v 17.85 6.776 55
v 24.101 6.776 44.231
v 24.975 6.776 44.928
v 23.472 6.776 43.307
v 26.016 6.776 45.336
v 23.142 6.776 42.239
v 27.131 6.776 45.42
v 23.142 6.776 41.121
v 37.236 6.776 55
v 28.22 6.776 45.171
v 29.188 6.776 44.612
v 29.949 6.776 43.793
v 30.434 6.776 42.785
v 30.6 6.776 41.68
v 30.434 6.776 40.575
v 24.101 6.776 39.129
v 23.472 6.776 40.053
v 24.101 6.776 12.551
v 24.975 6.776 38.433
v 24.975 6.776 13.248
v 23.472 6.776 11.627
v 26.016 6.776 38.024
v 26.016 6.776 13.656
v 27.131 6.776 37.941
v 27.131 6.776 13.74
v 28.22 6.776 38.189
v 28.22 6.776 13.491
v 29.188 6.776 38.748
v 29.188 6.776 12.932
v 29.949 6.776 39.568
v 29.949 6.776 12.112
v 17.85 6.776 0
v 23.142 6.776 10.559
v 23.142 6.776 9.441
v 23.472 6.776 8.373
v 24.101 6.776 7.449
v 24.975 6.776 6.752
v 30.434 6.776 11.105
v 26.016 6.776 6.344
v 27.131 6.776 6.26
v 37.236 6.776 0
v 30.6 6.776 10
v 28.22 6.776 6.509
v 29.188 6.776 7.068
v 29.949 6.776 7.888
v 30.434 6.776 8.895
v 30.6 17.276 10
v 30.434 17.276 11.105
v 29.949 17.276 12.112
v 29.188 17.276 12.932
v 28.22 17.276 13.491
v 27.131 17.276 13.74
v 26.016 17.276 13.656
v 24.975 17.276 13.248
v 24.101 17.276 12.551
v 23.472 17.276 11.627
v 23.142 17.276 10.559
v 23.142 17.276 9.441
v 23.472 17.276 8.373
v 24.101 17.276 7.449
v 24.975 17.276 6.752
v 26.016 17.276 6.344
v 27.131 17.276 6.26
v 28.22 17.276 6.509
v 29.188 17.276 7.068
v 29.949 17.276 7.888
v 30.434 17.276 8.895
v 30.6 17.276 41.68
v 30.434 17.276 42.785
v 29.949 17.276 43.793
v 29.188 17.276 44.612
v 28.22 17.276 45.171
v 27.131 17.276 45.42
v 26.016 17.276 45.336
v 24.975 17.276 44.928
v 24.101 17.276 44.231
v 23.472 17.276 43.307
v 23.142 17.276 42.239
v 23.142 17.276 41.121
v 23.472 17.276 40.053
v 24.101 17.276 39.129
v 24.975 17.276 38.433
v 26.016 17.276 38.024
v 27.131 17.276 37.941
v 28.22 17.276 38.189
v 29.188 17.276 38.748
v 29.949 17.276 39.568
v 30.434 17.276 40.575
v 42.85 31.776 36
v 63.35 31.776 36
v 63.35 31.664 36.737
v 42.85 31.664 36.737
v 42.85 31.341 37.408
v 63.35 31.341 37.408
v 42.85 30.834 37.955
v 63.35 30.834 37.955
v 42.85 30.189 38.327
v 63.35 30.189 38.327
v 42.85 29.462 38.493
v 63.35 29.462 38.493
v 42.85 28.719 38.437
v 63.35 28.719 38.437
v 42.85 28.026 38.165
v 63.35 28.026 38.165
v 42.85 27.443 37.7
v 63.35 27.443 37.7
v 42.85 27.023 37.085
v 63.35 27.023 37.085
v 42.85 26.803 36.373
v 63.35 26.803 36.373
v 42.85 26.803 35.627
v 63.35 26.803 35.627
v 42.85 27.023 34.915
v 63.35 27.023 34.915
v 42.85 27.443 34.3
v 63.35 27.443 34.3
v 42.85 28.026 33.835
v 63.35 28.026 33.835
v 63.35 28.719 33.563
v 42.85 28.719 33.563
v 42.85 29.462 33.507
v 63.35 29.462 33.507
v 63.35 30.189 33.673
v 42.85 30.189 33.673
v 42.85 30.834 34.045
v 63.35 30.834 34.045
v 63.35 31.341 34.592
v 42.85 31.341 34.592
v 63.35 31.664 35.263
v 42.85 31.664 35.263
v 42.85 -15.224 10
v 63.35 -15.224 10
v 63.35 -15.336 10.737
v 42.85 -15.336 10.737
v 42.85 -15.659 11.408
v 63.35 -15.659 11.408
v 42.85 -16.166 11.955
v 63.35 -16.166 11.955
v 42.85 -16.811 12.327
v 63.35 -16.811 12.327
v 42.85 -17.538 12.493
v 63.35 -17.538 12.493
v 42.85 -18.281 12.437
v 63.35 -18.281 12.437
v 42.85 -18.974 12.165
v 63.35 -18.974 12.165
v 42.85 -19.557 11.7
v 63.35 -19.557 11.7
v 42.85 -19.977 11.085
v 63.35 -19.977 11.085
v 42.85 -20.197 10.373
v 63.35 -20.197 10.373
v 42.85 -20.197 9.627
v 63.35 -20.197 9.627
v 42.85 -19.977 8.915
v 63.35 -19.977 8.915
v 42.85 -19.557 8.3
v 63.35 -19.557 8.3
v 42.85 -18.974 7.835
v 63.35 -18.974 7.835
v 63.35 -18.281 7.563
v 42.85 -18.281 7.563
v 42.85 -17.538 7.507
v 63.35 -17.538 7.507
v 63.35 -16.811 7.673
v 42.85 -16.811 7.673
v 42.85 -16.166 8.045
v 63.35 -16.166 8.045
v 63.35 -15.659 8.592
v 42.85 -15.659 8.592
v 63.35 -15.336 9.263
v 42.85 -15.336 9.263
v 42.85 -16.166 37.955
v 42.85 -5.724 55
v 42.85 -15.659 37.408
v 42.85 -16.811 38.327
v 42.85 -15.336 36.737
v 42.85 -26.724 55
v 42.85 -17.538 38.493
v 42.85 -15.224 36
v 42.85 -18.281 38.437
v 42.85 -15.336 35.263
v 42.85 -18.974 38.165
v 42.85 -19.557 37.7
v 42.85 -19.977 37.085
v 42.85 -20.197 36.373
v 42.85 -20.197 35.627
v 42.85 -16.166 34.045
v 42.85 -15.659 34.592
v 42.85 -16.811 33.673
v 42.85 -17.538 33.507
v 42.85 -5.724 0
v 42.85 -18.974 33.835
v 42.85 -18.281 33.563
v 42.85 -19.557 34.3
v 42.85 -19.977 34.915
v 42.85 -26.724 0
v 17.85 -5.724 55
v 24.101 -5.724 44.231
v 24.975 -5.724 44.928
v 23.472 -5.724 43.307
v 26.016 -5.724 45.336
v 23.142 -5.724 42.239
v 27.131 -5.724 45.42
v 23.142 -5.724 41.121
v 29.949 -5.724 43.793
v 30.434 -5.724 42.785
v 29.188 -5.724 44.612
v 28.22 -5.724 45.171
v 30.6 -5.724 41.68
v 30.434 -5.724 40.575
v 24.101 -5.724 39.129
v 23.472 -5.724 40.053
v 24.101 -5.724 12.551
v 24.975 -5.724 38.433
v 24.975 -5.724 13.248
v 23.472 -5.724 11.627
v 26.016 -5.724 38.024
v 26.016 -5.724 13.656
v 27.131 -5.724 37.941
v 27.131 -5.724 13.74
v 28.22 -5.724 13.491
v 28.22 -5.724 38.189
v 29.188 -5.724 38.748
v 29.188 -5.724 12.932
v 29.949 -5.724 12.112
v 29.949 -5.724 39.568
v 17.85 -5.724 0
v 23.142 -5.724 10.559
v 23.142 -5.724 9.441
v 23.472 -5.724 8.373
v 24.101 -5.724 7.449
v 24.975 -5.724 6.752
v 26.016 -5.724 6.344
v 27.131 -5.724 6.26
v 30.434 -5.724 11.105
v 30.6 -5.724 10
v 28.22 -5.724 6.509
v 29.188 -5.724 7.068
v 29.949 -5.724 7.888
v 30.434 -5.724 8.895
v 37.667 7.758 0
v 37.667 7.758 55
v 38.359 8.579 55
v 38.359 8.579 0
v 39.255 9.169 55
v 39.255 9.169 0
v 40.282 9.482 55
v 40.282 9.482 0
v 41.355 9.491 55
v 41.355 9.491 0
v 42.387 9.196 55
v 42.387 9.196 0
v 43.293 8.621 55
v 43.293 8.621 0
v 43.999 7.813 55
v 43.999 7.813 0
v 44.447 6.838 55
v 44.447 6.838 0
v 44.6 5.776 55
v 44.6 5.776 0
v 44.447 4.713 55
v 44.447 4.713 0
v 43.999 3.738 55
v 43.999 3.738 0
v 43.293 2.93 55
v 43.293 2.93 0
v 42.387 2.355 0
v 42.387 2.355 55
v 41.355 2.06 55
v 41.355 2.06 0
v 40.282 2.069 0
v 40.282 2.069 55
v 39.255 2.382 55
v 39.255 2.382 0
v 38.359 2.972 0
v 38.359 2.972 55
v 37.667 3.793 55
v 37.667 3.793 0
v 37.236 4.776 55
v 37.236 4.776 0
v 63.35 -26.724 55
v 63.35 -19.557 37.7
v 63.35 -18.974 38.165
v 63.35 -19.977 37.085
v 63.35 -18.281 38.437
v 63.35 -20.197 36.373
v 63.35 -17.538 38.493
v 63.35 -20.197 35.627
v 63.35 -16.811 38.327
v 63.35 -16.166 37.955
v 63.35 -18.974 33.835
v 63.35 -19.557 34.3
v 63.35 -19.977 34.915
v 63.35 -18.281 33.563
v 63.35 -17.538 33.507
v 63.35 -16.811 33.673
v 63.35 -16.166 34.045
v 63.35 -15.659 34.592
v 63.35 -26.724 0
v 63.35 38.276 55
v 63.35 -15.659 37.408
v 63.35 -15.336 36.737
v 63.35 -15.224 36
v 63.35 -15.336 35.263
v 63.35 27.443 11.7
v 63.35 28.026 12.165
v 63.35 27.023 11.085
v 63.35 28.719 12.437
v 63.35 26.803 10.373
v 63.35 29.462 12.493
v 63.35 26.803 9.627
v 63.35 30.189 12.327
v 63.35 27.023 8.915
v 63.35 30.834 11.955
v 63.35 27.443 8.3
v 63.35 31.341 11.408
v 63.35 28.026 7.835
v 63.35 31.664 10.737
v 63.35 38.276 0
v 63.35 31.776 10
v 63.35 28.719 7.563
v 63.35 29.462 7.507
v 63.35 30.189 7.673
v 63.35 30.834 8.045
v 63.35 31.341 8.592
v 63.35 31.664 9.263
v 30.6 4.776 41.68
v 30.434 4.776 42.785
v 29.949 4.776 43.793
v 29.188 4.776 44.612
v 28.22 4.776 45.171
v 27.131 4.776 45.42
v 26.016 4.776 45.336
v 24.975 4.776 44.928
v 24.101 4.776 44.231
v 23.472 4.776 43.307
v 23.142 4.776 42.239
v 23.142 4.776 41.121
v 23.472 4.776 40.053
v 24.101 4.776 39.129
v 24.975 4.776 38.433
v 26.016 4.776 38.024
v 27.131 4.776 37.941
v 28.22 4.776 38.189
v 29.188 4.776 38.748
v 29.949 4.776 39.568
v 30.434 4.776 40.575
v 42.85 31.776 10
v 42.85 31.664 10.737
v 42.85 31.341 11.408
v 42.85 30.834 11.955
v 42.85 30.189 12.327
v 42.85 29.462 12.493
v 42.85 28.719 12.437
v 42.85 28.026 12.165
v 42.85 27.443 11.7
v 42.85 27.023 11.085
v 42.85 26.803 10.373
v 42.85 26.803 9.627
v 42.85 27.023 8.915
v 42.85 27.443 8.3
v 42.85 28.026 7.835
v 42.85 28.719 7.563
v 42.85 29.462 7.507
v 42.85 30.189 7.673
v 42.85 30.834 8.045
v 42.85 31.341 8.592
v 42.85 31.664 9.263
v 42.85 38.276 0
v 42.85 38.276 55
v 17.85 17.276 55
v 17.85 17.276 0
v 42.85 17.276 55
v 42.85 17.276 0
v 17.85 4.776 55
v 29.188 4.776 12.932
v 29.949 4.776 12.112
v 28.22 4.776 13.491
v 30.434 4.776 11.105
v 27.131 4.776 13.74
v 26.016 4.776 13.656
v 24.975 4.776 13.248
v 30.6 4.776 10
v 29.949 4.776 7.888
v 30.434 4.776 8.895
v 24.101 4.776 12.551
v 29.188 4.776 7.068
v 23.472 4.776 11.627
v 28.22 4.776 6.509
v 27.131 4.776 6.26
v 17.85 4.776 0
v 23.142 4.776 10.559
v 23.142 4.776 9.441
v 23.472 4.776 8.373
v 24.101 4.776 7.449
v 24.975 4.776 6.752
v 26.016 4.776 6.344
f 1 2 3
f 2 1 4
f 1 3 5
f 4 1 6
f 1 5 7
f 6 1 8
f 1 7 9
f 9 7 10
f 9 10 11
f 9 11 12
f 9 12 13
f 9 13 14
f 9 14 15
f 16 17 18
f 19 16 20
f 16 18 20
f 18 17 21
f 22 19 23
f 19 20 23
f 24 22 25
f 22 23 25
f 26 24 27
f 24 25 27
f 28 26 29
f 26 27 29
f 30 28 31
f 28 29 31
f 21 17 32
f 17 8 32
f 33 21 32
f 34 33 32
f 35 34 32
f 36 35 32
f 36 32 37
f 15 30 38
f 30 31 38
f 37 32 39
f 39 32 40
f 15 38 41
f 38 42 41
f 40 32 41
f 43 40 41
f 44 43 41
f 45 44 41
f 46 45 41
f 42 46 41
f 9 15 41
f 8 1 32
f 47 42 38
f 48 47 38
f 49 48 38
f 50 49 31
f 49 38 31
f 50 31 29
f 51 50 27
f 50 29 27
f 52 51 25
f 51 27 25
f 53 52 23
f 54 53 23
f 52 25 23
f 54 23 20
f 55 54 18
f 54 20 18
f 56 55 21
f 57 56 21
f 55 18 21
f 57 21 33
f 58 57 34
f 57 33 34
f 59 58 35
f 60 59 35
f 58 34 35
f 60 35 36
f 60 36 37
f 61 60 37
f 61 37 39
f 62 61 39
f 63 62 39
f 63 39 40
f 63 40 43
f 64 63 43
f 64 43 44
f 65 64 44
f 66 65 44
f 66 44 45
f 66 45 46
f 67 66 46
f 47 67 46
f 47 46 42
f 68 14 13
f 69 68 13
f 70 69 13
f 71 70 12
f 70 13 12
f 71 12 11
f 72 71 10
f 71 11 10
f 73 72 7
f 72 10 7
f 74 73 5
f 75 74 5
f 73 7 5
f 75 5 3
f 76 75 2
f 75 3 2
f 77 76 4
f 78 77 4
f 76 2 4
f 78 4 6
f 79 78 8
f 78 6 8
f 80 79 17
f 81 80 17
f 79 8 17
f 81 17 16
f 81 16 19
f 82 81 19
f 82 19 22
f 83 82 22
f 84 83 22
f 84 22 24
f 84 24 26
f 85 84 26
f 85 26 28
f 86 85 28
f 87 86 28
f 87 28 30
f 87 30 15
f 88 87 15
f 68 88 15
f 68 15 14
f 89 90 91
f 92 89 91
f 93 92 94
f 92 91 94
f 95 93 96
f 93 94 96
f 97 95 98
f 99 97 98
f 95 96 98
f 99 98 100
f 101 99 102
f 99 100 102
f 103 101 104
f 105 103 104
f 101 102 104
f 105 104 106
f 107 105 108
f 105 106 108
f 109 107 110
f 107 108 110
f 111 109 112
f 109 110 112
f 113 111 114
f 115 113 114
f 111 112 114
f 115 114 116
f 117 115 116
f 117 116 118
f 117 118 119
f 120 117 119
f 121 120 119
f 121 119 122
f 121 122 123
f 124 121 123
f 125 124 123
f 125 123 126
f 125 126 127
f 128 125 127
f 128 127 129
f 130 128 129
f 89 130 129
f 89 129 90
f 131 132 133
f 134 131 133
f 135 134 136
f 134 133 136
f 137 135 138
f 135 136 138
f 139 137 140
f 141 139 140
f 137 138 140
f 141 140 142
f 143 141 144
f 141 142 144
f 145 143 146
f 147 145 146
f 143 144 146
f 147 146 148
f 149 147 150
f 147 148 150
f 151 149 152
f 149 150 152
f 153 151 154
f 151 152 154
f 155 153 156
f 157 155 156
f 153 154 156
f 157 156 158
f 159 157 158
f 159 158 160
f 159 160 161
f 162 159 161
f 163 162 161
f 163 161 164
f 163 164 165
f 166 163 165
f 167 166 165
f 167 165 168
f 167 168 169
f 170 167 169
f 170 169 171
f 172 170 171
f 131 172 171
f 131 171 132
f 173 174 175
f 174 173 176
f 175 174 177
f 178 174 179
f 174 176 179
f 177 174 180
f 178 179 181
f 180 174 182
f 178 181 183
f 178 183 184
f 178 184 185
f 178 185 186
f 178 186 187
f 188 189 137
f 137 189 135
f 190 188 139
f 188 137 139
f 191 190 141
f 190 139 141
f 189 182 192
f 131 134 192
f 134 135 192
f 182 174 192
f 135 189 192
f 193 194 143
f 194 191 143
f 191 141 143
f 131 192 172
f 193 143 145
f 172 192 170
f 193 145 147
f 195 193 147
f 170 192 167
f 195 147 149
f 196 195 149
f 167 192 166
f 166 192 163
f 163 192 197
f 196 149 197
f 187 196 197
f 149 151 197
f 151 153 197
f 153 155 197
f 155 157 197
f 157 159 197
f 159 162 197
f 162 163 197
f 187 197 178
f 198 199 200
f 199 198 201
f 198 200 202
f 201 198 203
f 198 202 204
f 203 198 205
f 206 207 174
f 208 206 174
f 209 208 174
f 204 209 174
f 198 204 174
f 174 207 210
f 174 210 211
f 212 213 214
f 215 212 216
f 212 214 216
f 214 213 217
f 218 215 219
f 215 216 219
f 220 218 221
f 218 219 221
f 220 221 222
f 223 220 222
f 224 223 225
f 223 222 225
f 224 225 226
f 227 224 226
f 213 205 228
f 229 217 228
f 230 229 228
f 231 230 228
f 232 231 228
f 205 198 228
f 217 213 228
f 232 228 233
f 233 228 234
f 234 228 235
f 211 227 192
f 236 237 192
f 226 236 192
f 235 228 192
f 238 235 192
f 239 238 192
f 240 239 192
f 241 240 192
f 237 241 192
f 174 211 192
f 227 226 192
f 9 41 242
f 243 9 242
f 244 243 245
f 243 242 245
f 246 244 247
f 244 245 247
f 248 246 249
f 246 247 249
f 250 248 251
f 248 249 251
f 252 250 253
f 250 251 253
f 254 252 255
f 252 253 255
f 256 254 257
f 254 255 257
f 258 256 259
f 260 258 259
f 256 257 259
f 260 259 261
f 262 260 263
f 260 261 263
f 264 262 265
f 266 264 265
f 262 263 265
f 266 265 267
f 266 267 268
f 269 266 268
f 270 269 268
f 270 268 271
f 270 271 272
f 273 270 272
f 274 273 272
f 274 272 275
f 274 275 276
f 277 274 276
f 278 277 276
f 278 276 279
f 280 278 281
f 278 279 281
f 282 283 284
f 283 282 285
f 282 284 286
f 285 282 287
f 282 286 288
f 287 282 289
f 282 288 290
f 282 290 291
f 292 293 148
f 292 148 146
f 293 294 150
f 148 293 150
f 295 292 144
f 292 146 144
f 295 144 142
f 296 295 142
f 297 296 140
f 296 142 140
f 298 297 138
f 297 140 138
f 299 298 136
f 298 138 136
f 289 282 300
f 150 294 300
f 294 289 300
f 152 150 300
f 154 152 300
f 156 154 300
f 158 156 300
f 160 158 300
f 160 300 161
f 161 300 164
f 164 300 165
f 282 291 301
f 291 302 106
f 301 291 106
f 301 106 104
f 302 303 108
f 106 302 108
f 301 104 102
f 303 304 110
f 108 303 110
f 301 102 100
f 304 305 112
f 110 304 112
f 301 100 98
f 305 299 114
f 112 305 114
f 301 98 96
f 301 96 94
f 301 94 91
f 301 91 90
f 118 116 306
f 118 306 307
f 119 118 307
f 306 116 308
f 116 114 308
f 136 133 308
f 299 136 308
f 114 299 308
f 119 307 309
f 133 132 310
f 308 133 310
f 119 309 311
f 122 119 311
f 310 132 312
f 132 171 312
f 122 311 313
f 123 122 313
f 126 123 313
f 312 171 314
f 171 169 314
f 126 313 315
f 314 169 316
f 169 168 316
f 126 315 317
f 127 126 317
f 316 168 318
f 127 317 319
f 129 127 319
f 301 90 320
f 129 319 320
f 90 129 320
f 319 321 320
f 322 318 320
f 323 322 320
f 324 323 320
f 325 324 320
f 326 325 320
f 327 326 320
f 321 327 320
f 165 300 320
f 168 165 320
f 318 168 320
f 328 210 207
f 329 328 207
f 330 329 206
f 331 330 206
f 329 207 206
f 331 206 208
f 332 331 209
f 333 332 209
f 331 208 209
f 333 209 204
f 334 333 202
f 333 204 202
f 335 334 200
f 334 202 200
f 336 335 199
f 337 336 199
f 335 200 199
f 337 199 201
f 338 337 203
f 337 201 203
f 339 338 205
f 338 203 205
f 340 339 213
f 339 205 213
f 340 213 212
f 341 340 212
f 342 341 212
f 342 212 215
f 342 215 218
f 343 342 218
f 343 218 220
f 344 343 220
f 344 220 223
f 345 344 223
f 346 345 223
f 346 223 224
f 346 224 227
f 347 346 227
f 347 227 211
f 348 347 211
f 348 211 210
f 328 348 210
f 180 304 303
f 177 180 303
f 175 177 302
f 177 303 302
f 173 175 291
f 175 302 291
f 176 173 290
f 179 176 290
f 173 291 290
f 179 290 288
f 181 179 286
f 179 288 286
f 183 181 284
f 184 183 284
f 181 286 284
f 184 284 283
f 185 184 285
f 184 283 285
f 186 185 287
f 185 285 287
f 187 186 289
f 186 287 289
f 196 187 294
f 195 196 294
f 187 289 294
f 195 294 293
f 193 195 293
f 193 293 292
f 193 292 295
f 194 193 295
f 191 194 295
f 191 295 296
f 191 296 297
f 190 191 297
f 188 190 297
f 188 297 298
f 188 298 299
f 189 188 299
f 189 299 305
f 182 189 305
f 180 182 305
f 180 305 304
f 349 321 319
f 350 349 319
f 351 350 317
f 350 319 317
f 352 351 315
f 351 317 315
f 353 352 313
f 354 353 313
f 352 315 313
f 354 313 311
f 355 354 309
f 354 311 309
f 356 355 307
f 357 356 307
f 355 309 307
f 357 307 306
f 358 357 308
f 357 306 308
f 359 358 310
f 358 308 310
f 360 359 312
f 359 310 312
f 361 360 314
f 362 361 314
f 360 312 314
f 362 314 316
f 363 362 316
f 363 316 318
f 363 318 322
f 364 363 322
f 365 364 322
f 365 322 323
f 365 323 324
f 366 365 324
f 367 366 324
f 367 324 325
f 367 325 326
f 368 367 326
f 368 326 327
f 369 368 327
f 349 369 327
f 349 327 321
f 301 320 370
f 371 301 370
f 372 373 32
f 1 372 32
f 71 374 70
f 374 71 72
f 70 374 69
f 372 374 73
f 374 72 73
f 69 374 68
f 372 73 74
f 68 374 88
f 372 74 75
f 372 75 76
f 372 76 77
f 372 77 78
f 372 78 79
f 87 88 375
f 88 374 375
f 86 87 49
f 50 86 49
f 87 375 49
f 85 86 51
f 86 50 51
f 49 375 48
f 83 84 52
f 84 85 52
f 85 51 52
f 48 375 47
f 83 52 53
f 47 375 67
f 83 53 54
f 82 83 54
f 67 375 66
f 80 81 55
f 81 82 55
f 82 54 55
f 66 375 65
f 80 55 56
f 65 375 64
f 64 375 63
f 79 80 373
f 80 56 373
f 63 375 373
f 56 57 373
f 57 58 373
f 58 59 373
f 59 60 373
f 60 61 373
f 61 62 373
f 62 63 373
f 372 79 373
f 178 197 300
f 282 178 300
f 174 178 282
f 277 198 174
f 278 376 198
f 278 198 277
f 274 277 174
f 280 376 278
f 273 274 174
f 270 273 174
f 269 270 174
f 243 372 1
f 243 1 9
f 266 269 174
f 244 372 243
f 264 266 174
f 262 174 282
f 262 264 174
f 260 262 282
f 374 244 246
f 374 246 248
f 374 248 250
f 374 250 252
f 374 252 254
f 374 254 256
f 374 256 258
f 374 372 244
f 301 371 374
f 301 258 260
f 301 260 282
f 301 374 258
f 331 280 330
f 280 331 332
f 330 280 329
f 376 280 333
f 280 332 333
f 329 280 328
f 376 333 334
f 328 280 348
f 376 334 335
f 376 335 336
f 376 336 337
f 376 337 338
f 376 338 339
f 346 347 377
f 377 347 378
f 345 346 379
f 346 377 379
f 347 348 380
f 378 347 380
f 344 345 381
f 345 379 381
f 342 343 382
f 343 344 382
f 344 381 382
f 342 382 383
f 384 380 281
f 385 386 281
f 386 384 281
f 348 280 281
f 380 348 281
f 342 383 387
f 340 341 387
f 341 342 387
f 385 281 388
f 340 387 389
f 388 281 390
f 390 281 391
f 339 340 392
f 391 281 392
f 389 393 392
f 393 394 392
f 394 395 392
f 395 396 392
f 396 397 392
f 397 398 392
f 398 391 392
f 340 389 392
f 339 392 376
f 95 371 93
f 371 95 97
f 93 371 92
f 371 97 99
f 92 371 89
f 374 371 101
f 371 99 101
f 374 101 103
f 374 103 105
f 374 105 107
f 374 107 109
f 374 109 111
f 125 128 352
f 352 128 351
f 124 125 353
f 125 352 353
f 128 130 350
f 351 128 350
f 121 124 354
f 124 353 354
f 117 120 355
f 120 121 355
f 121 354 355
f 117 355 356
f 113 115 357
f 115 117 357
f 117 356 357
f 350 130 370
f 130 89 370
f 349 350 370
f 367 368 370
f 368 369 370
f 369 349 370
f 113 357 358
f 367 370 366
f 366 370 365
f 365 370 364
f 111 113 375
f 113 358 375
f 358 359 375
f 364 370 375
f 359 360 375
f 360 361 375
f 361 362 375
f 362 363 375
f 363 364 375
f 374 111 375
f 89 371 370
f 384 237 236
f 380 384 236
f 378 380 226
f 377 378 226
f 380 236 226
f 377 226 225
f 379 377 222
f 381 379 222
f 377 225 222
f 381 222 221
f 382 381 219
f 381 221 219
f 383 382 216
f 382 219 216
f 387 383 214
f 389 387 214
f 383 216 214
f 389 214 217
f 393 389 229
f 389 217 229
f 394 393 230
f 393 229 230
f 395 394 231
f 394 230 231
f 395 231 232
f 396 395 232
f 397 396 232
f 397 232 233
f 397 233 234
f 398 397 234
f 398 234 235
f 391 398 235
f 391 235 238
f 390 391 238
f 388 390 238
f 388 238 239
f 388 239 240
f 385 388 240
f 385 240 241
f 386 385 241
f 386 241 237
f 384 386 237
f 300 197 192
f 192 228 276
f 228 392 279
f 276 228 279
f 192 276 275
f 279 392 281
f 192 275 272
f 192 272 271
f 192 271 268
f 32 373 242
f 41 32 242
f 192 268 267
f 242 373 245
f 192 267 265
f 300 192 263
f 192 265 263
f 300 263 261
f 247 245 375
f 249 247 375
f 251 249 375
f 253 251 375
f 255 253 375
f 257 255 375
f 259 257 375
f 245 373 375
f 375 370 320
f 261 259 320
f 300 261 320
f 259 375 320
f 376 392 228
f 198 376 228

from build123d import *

# Parameters (mm, degrees)
F1_DEPTH = 55
F2_R     = 2.5
F3_DEPTH = 45.501
F4_R     = 3.75
F5_DEPTH = 44.001


with BuildPart() as f1:
    # F0 (on Top) → F1 (new body)
    with BuildSketch(Plane.XY):
        with BuildLine():
            Line((63.350305, -26.724461), (63.350305, 38.275539))
            Line((63.350305, 38.275539), (42.850305, 38.275539))
            Line((42.850305, 38.275539), (42.850305, 17.275539))
            Line((42.850305, 17.275539), (17.850305, 17.275539))
            Line((17.850305, 17.275539), (17.850305, 6.775539))
            Line((17.850305, 6.775539), (37.236097, 6.775539))
            ThreePointArc((37.236097, 6.775539), (44.600305, 5.775539), (37.236097, 4.775539))
            Line((37.236097, 4.775539), (17.850305, 4.775539))
            Line((17.850305, 4.775539), (17.850305, -5.724461))
            Line((17.850305, -5.724461), (42.850305, -5.724461))
            Line((42.850305, -5.724461), (42.850305, -26.724461))
            Line((42.850305, -26.724461), (63.350305, -26.724461))
        make_face()
    extrude(amount=F1_DEPTH)

    # F2 (on face) → F3 (cut, through all)
    with BuildSketch(Plane.YZ.offset(63.350305)):
        with Locations((29.275539, 10)):
            Circle(F2_R)
        with Locations((29.275539, 36)):
            Circle(F2_R)
        with Locations((-17.724461, 10)):
            Circle(F2_R)
        with Locations((-17.724461, 36)):
            Circle(F2_R)
    extrude(amount=-F3_DEPTH, mode=Mode.SUBTRACT)

    # F4 (on face) → F5 (cut, through all)
    with BuildSketch(Plane.XZ.offset(5.724461)):
        with Locations((26.850305, 41.680109)):
            Circle(F4_R)
        with Locations((26.850305, 10)):
            Circle(F4_R)
    extrude(amount=-F5_DEPTH, mode=Mode.SUBTRACT)


solid = f1.part
